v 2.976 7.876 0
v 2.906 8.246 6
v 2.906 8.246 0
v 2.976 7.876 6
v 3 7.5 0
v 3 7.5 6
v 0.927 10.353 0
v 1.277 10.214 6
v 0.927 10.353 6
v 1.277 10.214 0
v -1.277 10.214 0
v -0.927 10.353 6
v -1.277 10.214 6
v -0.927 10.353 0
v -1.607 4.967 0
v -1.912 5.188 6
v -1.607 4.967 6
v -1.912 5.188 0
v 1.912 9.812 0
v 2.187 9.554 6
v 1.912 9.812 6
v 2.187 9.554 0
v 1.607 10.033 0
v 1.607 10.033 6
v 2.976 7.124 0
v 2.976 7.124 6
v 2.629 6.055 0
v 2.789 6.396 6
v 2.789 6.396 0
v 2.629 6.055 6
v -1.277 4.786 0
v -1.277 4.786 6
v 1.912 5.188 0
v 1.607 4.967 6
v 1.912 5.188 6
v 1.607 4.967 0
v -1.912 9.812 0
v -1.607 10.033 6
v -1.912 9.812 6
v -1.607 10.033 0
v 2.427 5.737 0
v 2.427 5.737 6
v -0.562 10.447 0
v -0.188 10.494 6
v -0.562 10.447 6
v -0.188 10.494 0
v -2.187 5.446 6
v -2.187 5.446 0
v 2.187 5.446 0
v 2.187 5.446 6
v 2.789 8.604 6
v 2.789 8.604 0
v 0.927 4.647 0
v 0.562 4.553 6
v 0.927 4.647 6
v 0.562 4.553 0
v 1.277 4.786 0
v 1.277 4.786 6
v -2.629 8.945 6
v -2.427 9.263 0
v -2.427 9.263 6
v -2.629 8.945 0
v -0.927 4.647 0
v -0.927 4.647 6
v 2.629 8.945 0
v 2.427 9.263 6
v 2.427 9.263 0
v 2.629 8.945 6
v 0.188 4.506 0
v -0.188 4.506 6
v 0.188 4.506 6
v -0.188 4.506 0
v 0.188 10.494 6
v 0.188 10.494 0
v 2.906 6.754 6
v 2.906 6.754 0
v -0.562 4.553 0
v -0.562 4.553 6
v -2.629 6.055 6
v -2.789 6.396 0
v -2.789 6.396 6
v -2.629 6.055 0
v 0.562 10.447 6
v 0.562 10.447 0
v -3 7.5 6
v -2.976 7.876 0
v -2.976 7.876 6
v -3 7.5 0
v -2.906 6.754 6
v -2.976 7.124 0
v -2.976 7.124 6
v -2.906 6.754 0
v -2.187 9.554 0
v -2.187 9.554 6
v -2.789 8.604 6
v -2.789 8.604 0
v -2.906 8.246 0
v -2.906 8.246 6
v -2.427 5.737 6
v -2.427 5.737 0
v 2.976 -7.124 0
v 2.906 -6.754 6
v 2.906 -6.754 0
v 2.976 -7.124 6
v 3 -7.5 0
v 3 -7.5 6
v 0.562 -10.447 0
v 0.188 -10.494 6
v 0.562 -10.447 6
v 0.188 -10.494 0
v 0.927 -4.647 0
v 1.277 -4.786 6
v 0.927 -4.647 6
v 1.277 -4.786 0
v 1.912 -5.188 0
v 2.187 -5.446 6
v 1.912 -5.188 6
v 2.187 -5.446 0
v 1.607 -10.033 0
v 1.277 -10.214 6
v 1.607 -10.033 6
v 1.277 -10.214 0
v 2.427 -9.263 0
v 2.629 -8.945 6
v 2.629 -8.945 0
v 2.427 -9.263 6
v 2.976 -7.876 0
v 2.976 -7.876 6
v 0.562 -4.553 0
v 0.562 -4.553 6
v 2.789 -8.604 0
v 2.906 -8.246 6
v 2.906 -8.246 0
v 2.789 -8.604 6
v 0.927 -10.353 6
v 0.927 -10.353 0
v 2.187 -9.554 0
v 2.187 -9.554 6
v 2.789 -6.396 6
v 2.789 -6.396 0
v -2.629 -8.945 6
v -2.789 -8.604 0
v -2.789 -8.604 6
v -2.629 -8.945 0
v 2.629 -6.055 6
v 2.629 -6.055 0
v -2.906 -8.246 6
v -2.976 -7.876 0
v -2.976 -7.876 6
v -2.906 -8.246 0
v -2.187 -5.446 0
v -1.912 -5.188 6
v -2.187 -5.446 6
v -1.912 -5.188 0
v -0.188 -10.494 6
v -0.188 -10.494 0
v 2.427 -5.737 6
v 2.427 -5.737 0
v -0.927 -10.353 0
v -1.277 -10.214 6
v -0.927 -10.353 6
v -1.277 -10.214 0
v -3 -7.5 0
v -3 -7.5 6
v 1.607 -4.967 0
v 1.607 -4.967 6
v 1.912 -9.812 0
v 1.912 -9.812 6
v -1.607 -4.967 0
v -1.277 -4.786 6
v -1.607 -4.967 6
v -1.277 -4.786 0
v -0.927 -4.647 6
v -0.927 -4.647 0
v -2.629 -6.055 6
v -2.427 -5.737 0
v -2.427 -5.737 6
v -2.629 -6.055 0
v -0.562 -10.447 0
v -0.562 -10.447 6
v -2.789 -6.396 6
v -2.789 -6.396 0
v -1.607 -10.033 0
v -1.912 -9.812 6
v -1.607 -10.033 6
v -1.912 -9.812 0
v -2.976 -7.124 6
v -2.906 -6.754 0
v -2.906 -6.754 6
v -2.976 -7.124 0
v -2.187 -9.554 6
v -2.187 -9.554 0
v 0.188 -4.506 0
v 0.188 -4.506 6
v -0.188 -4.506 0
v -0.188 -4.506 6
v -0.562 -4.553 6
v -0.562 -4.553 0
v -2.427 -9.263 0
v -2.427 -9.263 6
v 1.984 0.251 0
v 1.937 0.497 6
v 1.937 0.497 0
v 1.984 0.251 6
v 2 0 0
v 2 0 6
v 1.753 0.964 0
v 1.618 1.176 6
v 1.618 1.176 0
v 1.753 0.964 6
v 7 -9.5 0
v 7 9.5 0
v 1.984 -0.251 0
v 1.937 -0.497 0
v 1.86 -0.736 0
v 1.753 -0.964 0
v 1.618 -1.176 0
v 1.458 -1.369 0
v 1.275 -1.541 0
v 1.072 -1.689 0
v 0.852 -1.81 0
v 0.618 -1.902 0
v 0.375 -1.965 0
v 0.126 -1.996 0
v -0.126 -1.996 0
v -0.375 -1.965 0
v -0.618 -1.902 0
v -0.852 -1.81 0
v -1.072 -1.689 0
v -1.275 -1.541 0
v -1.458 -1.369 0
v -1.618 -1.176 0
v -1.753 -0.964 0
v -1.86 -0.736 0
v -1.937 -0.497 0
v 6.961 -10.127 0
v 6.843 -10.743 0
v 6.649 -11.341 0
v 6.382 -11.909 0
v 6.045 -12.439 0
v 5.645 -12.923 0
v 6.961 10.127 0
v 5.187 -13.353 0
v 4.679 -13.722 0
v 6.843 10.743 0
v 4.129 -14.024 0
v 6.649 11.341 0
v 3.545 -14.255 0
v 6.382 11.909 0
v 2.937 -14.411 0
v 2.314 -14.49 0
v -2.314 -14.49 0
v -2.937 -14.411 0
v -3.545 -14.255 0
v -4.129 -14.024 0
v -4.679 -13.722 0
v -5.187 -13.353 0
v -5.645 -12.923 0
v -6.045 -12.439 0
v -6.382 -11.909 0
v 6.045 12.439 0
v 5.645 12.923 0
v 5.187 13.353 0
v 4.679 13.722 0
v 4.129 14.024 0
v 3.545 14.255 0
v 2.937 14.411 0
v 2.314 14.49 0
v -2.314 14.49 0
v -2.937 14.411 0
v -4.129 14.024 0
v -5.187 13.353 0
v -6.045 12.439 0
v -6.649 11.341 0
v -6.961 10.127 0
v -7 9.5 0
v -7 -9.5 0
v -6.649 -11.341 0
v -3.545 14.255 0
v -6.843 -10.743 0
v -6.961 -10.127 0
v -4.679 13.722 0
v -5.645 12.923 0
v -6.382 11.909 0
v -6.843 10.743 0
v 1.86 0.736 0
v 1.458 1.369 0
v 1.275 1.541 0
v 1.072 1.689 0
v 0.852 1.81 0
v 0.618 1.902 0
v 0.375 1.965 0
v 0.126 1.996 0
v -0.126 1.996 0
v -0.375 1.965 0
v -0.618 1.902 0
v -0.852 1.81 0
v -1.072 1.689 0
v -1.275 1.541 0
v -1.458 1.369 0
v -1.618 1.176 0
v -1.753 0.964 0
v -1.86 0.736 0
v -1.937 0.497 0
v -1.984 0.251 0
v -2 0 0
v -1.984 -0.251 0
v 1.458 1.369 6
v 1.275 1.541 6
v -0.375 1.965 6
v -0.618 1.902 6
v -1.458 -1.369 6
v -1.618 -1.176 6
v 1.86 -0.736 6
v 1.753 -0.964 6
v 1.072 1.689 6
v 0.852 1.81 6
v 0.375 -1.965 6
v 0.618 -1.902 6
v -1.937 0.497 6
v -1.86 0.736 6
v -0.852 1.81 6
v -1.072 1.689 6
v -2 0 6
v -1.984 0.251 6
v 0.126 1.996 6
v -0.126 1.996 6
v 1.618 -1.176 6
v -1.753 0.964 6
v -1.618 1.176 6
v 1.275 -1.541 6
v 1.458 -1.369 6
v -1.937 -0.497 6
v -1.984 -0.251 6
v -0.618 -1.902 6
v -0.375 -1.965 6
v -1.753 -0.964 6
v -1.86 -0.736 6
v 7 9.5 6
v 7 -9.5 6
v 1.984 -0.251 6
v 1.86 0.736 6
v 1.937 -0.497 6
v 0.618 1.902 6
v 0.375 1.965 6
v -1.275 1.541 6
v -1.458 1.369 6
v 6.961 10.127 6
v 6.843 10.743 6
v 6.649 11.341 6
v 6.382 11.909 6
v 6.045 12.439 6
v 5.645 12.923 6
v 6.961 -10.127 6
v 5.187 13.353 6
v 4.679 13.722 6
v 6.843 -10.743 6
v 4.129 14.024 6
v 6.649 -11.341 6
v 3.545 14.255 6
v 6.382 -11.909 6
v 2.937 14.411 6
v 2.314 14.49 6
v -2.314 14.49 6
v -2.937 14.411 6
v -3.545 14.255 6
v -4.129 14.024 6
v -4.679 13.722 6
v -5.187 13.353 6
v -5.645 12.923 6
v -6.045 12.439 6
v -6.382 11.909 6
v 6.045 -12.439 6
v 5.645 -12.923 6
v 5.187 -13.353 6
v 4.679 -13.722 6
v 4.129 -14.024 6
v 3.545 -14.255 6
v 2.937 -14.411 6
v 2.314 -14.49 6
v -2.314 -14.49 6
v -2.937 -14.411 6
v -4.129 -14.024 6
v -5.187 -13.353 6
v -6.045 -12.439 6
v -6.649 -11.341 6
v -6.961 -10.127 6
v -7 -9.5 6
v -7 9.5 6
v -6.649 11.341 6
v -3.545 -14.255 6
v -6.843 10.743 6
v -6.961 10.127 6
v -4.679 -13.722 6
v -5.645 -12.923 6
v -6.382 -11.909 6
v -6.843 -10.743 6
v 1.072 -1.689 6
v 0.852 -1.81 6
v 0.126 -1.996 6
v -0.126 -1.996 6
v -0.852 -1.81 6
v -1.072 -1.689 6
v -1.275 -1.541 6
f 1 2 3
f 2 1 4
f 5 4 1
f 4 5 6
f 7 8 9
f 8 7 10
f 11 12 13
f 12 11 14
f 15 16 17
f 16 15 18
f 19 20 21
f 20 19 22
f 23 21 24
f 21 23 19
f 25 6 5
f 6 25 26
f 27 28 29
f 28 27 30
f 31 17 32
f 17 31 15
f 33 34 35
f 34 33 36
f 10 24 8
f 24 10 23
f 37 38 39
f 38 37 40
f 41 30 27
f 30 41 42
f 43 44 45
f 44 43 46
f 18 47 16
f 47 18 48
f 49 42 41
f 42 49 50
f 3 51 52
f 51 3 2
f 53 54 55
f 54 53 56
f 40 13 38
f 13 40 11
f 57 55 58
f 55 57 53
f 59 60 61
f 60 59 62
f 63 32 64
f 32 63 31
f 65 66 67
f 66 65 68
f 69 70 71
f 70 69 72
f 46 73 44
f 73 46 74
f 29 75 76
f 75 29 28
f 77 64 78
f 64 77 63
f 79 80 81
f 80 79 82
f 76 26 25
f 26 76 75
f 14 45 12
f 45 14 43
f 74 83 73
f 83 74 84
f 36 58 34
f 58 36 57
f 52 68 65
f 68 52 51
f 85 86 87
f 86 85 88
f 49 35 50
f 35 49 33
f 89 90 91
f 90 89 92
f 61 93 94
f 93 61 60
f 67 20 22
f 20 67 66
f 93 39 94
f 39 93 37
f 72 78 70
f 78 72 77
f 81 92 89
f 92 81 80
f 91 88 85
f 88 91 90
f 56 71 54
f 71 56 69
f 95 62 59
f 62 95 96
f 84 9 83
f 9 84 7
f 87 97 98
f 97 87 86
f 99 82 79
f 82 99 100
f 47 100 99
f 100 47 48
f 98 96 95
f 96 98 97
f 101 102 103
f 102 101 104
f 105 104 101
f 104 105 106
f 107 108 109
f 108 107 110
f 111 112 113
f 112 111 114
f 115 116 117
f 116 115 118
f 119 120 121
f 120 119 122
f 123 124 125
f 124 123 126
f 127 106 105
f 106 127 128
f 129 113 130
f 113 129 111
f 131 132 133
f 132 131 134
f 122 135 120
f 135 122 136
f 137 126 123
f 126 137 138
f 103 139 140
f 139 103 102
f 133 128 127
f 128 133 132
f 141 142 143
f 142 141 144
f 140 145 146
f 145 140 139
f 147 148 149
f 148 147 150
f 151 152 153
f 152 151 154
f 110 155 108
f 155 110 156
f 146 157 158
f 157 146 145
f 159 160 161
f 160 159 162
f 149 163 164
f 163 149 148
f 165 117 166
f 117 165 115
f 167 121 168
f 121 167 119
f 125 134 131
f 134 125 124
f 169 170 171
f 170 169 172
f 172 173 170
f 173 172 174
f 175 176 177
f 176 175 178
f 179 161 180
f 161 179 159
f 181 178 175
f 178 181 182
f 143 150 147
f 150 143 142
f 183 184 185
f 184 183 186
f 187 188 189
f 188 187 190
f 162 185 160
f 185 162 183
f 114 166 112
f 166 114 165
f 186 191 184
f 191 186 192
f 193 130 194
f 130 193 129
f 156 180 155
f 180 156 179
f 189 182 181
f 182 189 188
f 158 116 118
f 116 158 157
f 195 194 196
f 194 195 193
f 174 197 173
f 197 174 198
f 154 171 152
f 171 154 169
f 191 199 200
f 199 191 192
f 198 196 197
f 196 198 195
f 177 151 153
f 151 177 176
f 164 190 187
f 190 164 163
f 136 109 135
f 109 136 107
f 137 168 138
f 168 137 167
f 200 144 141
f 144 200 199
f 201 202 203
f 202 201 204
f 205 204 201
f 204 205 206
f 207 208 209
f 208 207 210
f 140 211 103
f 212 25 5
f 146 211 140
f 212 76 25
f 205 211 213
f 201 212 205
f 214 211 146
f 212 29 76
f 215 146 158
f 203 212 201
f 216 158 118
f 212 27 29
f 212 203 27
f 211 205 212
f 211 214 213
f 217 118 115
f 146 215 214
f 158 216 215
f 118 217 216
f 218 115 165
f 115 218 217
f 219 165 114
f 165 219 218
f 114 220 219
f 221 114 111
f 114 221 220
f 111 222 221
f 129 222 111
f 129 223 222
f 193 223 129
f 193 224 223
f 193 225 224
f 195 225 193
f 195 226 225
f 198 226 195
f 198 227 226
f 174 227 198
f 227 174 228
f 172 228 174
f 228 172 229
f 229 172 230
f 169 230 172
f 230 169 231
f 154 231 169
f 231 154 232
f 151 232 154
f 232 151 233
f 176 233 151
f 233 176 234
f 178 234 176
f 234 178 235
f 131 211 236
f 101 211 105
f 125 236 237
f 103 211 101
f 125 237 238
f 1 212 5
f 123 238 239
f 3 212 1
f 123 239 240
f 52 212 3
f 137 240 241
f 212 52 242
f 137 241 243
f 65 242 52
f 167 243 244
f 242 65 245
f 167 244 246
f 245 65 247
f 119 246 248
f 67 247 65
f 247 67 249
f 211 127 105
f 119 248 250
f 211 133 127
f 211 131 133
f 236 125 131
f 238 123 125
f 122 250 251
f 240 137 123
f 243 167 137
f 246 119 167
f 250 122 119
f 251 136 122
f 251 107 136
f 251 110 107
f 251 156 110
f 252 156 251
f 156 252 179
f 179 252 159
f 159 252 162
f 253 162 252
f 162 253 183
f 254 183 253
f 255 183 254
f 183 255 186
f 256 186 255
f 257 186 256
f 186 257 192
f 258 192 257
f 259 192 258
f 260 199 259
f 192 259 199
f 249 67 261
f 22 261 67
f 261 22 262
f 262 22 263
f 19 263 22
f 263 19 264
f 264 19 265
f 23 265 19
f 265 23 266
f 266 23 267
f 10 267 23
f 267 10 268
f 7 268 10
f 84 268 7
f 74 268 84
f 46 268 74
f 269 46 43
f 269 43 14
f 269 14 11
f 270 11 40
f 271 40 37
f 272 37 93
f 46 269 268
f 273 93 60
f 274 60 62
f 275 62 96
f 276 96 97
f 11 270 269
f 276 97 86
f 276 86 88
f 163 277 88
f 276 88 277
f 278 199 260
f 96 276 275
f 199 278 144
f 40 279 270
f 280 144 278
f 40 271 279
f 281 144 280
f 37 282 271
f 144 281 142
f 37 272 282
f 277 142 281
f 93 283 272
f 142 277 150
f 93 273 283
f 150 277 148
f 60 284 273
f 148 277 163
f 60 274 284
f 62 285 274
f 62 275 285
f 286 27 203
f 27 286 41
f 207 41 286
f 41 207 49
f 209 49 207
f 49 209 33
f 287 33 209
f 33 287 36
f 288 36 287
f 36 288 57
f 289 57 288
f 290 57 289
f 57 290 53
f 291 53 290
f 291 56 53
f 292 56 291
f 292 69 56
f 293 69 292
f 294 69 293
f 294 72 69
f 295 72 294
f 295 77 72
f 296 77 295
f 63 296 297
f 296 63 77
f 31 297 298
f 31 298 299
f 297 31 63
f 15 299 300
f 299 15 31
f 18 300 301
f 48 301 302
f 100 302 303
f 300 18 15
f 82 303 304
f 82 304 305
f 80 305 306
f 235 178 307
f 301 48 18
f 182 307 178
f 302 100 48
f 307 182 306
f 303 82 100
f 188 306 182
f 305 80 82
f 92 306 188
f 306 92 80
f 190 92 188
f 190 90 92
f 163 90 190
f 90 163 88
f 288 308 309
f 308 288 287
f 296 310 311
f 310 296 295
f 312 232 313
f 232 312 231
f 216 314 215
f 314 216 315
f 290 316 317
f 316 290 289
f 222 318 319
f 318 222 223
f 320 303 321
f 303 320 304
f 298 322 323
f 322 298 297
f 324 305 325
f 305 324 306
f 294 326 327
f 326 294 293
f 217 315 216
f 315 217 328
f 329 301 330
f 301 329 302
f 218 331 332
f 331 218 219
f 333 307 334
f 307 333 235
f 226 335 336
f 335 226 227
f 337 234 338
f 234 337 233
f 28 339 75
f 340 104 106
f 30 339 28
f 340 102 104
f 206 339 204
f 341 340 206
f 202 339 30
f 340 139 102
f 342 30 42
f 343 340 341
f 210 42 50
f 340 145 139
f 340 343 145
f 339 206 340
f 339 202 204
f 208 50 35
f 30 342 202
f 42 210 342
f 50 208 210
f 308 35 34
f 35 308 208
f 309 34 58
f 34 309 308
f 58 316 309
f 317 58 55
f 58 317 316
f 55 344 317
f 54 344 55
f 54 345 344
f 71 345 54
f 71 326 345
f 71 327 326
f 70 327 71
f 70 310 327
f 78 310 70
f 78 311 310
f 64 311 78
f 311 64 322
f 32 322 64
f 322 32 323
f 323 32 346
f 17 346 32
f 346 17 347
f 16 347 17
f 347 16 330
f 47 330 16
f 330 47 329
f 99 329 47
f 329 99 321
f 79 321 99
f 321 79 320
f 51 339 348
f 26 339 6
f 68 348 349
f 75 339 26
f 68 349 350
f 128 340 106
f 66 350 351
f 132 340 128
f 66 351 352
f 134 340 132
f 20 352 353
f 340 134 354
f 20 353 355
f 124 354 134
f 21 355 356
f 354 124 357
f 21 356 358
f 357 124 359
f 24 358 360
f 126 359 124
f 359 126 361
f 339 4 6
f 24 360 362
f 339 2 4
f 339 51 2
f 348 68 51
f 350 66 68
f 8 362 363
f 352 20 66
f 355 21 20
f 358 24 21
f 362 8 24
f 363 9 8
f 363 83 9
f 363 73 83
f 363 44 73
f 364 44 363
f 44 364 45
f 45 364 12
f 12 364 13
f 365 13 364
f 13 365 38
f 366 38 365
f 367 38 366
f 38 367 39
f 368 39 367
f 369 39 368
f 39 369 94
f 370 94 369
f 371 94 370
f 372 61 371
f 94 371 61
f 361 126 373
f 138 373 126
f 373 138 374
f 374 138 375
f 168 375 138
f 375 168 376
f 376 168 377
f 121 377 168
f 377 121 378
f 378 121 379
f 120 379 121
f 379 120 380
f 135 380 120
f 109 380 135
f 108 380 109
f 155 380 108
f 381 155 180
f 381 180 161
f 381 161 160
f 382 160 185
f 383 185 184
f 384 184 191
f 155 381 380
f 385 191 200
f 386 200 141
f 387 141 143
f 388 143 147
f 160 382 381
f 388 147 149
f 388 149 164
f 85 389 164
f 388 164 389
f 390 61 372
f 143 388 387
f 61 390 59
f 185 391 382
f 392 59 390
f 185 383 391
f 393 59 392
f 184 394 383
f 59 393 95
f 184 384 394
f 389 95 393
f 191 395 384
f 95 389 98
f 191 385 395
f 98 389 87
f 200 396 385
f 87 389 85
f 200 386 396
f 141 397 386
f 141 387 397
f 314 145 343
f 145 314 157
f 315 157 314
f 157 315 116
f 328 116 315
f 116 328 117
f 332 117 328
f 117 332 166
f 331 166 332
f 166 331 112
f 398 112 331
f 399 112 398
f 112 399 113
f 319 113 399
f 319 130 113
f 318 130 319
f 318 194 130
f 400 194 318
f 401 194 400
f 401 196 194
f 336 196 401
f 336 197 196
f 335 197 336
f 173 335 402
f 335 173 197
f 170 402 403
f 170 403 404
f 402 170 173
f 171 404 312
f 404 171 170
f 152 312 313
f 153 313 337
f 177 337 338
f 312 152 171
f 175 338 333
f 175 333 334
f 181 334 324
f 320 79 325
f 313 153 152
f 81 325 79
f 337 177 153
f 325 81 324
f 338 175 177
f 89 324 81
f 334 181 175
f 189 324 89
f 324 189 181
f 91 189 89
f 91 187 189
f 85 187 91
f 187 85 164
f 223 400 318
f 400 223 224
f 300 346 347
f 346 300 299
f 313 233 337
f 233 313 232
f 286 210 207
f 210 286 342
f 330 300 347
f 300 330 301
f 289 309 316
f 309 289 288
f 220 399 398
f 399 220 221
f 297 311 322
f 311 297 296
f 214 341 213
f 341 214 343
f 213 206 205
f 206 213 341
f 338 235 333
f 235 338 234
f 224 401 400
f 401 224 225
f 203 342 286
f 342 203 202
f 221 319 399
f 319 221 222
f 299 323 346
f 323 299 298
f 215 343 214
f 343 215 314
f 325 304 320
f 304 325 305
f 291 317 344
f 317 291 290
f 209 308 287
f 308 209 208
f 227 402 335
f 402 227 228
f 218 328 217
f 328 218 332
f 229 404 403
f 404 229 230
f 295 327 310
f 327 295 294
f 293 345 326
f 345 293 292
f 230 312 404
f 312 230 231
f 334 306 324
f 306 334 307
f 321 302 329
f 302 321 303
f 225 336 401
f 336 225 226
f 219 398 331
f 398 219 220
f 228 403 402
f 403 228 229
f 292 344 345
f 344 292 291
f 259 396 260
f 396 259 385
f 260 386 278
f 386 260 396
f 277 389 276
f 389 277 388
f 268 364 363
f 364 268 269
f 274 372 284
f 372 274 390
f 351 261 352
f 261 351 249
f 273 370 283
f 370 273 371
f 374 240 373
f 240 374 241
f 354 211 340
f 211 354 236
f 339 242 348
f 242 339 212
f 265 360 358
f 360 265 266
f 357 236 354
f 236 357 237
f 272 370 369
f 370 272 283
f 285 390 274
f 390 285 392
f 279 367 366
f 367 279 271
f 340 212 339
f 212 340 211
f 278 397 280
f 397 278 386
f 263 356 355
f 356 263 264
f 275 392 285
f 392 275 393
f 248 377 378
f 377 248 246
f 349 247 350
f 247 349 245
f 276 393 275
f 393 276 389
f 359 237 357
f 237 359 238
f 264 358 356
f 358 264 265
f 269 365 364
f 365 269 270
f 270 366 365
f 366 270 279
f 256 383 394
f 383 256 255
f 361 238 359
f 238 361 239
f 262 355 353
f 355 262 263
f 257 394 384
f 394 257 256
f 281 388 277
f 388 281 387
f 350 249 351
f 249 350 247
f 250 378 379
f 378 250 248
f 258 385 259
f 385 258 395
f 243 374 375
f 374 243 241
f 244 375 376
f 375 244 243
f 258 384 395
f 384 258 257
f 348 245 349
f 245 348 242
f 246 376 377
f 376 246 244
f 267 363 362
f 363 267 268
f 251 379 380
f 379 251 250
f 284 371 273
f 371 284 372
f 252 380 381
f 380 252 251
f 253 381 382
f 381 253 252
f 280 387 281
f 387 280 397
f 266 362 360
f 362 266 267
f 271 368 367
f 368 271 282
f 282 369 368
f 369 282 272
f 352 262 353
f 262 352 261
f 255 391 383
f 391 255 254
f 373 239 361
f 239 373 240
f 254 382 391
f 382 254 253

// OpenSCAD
$fn = 50;


difference() {
	union() {
		hull() {
			translate(v = [-2.0000000000, 9.5000000000, 0]) {
				cylinder(h = 6, r = 5);
			}
			translate(v = [2.0000000000, 9.5000000000, 0]) {
				cylinder(h = 6, r = 5);
			}
			translate(v = [-2.0000000000, -9.5000000000, 0]) {
				cylinder(h = 6, r = 5);
			}
			translate(v = [2.0000000000, -9.5000000000, 0]) {
				cylinder(h = 6, r = 5);
			}
		}
	}
	union() {
		#translate(v = [0.0000000000, 7.5000000000, 0]) {
			cylinder(h = 6, r = 3.0000000000);
		}
		#translate(v = [0.0000000000, -7.5000000000, 0]) {
			cylinder(h = 6, r = 3.0000000000);
		}
		#translate(v = [0.0000000000, -7.5000000000, -100.0000000000]) {
			cylinder(h = 200, r = 3.0000000000);
		}
		#translate(v = [0.0000000000, -7.5000000000, -100.0000000000]) {
			cylinder(h = 200, r = 3.0000000000);
		}
		#translate(v = [0.0000000000, 7.5000000000, -100.0000000000]) {
			cylinder(h = 200, r = 3.0000000000);
		}
		#translate(v = [0.0000000000, 7.5000000000, -100.0000000000]) {
			cylinder(h = 200, r = 3.0000000000);
		}
		#translate(v = [0.0000000000, 7.5000000000, 0]) {
			cylinder(h = 6, r = 1.5000000000);
		}
		#translate(v = [0.0000000000, -7.5000000000, 0]) {
			cylinder(h = 6, r = 1.5000000000);
		}
		#translate(v = [0.0000000000, 7.5000000000, 0]) {
			cylinder(h = 6, r = 1.5000000000);
		}
		#translate(v = [0.0000000000, -7.5000000000, 0]) {
			cylinder(h = 6, r = 1.5000000000);
		}
		#translate(v = [0.0000000000, 7.5000000000, 0]) {
			cylinder(h = 6, r = 1.5000000000);
		}
		#translate(v = [0.0000000000, -7.5000000000, 0]) {
			cylinder(h = 6, r = 1.5000000000);
		}
		#cylinder(h = 6, r = 2.0000000000);
	}
}
